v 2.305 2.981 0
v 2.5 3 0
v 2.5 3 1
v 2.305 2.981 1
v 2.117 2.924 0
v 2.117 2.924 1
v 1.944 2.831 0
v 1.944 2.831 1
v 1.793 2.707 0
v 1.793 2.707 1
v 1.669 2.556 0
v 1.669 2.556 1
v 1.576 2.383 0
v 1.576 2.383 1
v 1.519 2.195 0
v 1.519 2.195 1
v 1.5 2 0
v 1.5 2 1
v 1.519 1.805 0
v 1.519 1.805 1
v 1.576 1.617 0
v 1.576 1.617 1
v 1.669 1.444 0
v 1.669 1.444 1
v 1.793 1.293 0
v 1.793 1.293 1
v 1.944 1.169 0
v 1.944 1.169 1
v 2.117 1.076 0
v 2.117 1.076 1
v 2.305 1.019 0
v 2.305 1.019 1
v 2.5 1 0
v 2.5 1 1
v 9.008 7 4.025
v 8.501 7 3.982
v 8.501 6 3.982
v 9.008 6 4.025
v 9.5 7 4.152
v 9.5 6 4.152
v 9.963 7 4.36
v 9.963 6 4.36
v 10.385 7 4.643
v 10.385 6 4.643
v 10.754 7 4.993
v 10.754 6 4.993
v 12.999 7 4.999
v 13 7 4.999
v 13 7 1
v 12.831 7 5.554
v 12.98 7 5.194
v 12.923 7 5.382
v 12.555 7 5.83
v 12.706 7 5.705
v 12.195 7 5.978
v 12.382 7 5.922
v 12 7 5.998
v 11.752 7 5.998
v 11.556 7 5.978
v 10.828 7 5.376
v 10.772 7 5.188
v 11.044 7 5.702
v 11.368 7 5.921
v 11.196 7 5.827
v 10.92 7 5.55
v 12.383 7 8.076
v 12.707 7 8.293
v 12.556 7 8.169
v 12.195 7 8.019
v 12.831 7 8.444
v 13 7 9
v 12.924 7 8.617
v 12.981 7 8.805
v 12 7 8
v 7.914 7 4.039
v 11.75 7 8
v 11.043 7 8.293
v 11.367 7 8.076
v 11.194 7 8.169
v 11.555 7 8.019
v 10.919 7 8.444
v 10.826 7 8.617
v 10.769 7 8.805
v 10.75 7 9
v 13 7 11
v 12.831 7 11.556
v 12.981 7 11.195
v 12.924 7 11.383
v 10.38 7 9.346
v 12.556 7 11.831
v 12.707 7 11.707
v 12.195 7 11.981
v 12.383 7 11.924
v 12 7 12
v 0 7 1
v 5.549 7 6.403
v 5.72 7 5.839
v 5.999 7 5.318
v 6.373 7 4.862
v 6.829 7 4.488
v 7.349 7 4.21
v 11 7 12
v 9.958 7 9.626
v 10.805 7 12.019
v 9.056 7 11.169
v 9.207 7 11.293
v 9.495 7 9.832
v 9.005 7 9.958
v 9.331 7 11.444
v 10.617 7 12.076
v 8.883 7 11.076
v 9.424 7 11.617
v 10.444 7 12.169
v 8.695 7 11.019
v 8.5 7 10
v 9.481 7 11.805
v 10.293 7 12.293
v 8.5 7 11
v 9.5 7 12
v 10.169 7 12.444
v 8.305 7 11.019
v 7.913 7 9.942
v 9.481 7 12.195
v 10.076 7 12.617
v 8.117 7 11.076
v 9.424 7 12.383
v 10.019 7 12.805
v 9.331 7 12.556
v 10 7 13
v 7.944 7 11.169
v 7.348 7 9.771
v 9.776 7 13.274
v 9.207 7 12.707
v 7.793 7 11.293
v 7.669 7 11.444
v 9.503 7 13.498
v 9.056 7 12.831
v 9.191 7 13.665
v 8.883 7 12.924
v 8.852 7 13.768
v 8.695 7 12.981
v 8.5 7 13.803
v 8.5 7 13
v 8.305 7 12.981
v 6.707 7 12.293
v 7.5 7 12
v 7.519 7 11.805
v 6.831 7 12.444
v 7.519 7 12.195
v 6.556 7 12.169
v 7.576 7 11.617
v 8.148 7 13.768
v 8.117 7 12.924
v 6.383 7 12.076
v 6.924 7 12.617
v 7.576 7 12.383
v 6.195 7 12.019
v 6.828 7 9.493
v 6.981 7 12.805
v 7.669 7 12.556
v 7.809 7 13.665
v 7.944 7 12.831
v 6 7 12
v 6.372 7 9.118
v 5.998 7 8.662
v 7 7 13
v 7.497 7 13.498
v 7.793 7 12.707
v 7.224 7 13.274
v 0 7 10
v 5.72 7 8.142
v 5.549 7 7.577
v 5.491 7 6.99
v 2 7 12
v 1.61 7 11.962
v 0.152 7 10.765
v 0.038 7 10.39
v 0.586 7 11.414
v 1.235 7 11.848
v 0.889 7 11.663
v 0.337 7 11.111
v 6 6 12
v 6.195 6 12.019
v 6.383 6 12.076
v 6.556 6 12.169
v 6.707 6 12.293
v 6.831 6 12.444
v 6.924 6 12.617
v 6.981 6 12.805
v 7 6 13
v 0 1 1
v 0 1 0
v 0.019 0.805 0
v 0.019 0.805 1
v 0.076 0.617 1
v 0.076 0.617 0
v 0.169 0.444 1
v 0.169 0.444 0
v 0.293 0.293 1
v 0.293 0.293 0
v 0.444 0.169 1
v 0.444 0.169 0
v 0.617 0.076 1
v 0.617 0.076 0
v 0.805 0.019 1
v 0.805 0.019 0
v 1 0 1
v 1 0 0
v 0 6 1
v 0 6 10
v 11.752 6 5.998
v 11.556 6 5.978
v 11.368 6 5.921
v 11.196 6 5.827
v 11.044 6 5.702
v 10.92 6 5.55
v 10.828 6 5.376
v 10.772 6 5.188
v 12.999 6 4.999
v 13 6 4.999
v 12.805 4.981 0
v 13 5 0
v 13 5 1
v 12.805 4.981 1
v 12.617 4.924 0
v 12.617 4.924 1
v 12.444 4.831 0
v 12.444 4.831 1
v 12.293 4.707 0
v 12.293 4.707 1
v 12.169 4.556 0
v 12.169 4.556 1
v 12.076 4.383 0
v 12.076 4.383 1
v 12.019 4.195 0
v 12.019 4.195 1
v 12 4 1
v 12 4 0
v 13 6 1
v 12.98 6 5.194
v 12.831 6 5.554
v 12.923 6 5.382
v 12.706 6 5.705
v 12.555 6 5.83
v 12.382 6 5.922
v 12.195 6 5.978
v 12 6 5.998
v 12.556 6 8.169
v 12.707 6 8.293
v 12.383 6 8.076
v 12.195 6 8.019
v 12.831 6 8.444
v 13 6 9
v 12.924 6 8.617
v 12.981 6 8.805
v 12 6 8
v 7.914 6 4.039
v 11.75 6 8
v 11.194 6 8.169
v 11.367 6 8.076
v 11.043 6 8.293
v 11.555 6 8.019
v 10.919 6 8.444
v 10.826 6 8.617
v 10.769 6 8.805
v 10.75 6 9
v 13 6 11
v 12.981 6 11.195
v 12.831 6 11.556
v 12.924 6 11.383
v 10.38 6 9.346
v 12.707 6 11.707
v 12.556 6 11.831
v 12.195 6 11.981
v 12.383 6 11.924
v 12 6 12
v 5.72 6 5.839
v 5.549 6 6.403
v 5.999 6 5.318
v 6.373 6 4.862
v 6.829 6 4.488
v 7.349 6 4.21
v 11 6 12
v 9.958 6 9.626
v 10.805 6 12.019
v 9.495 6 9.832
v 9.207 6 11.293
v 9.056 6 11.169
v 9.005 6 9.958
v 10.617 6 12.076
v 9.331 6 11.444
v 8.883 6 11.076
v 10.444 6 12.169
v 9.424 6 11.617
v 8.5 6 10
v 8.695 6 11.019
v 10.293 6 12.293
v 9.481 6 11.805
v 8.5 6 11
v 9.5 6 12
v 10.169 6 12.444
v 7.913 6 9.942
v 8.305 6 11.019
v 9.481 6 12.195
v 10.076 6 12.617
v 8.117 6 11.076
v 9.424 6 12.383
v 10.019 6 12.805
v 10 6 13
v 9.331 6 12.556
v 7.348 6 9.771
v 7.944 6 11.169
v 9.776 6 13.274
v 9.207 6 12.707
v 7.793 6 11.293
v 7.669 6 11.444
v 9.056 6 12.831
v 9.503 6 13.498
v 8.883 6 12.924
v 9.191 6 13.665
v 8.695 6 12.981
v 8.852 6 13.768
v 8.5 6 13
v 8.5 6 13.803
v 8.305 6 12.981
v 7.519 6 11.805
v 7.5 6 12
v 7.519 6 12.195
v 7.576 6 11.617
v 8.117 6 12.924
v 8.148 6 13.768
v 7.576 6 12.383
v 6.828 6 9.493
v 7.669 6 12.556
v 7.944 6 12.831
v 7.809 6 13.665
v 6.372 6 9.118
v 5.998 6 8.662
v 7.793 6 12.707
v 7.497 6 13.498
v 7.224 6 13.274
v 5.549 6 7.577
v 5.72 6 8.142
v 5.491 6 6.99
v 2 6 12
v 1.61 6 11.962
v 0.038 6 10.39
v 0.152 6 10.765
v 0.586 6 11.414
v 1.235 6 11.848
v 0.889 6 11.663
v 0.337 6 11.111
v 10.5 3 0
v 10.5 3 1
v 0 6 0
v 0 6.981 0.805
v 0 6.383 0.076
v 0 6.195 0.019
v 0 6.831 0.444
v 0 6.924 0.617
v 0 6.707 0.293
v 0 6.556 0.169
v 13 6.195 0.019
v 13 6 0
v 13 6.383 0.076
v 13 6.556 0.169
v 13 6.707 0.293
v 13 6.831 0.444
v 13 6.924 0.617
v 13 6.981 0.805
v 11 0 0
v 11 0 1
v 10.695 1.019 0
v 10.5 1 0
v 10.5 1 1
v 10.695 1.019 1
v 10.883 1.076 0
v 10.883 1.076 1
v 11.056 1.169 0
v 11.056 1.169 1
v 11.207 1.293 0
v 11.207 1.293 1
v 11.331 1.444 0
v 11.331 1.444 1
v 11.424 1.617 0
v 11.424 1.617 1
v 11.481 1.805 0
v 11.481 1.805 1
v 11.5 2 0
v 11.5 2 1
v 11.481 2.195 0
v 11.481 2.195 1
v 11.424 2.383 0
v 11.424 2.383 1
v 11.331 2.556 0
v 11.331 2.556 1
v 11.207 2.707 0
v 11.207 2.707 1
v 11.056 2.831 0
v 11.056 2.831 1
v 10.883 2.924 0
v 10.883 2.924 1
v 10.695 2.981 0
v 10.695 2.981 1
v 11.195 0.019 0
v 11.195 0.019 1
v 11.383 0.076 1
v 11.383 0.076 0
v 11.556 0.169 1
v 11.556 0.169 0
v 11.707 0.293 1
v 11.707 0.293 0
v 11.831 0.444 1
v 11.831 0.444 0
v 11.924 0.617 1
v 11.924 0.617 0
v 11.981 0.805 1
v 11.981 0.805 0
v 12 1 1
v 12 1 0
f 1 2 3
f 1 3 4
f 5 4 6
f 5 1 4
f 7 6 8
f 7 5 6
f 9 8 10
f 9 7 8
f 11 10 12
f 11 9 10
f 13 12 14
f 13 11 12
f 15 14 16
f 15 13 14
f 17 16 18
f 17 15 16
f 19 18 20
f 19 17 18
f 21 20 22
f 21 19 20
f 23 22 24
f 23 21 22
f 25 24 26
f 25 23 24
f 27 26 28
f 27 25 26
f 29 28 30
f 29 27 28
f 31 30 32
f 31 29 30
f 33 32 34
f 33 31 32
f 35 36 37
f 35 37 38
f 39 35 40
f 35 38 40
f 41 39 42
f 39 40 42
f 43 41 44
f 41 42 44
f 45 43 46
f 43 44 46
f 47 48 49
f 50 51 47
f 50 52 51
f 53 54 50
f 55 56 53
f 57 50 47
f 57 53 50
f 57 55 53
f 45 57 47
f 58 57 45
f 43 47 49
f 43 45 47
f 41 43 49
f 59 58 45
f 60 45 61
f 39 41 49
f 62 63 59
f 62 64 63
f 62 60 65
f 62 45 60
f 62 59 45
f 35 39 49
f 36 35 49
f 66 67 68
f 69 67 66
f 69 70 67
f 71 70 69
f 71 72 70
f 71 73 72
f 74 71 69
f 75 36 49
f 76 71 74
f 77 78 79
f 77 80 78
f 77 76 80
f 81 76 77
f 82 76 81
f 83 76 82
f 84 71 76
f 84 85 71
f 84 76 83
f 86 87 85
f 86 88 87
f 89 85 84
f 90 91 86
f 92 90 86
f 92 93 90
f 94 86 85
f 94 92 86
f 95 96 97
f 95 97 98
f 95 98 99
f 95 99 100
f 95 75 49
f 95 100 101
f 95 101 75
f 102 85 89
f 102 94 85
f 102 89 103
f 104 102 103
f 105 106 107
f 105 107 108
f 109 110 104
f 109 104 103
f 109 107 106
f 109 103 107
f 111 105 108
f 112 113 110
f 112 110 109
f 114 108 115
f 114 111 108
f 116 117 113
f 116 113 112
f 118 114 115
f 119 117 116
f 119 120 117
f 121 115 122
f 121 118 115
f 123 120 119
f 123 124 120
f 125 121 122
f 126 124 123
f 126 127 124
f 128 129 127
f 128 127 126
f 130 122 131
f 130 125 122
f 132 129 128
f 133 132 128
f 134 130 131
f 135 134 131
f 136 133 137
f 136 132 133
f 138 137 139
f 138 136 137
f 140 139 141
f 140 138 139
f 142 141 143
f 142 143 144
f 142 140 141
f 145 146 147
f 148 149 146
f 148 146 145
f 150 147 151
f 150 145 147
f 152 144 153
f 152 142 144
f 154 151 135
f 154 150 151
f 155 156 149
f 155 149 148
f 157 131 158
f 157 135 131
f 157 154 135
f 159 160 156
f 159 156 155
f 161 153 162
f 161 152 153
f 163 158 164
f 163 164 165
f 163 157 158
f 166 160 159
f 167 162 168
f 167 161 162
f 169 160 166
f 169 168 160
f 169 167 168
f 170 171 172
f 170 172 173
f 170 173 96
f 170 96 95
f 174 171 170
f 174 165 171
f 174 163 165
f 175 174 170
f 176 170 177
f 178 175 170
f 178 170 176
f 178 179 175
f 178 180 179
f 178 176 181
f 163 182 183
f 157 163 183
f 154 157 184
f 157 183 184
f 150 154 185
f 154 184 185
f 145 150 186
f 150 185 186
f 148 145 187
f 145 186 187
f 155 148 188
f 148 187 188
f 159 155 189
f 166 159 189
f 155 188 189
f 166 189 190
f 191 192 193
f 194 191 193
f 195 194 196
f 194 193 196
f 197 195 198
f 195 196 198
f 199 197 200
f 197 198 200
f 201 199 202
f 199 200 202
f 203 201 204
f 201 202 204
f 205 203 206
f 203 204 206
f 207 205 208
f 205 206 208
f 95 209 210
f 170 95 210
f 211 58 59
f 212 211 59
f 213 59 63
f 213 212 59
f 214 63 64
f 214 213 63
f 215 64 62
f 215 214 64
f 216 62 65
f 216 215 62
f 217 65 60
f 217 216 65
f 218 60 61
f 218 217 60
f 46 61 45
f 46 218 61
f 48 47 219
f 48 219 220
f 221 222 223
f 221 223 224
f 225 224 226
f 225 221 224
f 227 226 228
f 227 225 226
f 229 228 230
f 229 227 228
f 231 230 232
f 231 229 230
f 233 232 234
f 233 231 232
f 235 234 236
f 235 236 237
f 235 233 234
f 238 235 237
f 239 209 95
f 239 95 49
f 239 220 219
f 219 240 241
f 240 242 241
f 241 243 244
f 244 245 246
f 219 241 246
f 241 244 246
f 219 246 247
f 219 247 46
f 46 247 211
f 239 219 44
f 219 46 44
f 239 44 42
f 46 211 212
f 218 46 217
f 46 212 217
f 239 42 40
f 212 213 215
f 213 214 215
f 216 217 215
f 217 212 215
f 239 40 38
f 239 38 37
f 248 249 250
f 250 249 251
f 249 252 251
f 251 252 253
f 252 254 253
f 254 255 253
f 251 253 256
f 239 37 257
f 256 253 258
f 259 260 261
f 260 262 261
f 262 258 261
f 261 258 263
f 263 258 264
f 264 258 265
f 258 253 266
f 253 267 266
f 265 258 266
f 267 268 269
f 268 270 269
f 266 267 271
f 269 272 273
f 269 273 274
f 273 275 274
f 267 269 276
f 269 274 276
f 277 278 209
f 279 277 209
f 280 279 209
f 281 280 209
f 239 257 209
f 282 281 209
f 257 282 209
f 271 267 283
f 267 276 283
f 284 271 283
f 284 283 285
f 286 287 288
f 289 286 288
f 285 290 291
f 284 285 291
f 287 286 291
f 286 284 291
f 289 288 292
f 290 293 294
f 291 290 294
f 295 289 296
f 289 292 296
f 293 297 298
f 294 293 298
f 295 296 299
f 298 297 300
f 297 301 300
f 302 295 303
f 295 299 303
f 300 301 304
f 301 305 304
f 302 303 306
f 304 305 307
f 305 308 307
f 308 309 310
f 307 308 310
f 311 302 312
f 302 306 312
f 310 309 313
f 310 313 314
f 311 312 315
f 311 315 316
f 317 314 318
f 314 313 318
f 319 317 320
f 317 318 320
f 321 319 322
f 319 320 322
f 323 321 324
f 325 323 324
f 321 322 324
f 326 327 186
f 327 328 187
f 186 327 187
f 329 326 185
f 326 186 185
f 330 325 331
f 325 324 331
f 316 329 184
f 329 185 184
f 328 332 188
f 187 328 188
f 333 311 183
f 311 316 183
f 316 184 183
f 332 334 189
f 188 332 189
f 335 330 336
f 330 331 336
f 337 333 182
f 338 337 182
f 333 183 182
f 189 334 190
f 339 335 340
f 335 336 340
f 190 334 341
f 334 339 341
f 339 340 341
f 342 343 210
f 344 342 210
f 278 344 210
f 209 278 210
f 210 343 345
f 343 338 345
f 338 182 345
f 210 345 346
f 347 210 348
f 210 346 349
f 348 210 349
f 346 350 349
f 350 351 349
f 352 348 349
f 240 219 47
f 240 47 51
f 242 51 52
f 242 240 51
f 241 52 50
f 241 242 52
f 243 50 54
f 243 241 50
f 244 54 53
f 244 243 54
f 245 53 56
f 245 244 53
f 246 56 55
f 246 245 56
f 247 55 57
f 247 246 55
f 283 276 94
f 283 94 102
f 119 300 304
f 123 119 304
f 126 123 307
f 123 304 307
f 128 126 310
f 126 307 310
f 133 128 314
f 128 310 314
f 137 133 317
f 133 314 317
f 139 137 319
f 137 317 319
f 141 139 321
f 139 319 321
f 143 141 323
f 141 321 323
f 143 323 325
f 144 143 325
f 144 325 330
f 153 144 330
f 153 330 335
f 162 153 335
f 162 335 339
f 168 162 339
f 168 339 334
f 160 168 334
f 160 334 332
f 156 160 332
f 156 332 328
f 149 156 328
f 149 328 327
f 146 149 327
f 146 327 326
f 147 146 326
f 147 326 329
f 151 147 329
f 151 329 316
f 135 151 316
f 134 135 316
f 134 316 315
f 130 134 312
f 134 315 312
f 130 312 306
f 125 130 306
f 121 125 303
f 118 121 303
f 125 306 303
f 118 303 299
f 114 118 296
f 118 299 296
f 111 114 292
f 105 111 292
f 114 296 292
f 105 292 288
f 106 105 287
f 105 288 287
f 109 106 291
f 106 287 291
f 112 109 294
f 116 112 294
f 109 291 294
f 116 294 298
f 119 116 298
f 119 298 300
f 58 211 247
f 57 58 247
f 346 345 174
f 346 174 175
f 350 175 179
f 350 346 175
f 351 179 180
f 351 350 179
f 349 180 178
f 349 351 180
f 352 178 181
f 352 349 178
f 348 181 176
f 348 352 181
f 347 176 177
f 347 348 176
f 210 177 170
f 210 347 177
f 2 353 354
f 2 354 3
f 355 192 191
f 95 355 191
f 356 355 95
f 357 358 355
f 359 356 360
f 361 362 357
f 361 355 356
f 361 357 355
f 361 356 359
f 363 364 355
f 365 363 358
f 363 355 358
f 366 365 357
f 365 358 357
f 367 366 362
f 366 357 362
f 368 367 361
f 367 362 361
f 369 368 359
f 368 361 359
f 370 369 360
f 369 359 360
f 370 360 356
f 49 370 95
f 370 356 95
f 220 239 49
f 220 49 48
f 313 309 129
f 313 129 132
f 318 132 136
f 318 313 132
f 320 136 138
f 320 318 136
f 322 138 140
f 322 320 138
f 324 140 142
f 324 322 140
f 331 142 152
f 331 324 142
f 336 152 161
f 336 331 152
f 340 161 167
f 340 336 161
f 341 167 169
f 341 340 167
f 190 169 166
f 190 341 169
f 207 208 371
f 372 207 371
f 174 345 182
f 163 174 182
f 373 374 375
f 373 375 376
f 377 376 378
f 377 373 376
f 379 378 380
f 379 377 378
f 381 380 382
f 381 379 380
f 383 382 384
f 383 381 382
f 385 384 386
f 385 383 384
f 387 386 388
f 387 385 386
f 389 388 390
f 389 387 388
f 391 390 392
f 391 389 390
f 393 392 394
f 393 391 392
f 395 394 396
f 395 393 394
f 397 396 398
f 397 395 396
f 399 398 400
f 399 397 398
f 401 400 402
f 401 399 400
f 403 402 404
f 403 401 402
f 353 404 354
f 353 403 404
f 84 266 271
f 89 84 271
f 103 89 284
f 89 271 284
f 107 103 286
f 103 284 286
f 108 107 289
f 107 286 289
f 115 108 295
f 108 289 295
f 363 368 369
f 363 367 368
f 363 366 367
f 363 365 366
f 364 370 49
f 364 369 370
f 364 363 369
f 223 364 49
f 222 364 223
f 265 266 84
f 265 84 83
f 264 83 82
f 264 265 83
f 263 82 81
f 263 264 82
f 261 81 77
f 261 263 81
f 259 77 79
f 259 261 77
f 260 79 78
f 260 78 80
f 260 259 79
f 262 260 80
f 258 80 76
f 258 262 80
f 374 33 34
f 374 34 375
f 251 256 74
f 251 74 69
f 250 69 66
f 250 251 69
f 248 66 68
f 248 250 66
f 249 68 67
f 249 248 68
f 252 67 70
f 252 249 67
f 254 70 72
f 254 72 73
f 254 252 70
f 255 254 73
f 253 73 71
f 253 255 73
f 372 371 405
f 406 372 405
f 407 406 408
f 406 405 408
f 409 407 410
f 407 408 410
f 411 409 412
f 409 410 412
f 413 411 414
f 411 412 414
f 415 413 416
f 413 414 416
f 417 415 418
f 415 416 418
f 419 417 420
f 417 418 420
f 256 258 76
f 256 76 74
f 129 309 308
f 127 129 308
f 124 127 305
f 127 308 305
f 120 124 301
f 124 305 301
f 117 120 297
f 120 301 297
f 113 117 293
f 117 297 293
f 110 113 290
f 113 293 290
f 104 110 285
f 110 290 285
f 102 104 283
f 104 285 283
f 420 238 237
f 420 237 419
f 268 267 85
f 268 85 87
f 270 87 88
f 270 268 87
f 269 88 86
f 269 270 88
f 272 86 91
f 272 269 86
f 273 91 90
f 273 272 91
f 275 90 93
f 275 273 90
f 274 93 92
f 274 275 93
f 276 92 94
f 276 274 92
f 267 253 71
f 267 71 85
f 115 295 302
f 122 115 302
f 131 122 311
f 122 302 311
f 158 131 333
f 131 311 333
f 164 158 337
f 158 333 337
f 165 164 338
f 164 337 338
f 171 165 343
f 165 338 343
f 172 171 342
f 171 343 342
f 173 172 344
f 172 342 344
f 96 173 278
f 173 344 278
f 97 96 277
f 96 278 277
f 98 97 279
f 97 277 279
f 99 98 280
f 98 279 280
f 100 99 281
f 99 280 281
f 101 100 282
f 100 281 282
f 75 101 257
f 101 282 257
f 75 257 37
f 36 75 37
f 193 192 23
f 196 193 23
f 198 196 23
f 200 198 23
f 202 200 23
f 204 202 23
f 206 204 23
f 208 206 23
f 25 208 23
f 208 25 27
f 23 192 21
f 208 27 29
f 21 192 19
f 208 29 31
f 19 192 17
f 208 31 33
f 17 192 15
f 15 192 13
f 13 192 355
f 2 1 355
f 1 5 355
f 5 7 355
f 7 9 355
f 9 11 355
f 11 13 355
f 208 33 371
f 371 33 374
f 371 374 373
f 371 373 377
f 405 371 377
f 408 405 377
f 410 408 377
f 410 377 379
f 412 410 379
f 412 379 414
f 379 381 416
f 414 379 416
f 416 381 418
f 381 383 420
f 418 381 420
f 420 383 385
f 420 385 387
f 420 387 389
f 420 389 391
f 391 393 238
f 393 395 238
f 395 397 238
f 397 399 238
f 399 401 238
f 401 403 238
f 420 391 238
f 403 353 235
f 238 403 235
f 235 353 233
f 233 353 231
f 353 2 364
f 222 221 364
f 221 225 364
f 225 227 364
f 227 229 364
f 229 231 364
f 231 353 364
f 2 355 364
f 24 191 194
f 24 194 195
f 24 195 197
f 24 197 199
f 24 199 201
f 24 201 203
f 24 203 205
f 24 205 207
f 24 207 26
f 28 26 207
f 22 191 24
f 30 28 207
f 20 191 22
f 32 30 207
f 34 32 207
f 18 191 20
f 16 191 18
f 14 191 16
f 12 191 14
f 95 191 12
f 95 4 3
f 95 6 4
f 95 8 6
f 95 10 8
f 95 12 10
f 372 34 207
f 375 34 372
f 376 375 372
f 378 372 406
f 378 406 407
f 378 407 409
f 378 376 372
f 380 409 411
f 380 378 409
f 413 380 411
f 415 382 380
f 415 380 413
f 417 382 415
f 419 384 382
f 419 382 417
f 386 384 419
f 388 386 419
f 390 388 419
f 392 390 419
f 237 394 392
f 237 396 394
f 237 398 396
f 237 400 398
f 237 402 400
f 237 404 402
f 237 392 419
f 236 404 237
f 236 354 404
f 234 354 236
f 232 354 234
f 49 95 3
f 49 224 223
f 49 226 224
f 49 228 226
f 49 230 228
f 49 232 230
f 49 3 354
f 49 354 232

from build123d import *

# Parameters (mm, degrees)
EXTRUDE004_DEPTH                     = 5
EXTRUDE004_ONTO_SKETCH003_ROLL_ANGLE = 90
SKETCH004_AS_DRAWN_R                 = 1
EXTRUDE003_DEPTH                     = 10
EXTRUDE003_ONTO_SKETCH004_ROLL_ANGLE = 90
EXTRUDE005_DEPTH                     = 1
EXTRUDE005_ONTO_SKETCH002_ROLL_ANGLE = 90
EXTRUDE006_DEPTH                     = 15
EXTRUDE001_DEPTH                     = 1
EXTRUDE_DEPTH                        = 1


with BuildPart() as extrude004:
    # Sketch003 as drawn → Extrude004 (new)
    with BuildSketch(Plane.XY):
        with BuildLine():
            ThreePointArc((8.500012, 10), (5.490931, 6.990186), (8.501267, 3.981628))
            ThreePointArc((8.501267, 3.981628), (9.735803, 4.24621), (10.754109, 4.992623))
            ThreePointArc((11.751661, 5.997636), (11.044132, 5.702333), (10.754109, 4.992623))
            Line((11.751661, 5.997636), (12.000229, 5.997636))
            ThreePointArc((12.999313, 4.999389), (12.706459, 5.705374), (12.000229, 5.997636))
            Line((12.999313, 4.999389), (15.5, 5))
            Line((15.5, 5), (15.5, 9))
            Line((13, 9), (15.5, 9))
            ThreePointArc((12, 8), (12.707107, 8.292893), (13, 9))
            Line((11.75, 8), (12, 8))
            ThreePointArc((10.75, 9), (11.042893, 8.292893), (11.75, 8))
            ThreePointArc((10.75, 9), (9.731212, 9.738962), (8.500012, 10))
        make_face()
    extrude(amount=-EXTRUDE004_DEPTH)


with BuildPart() as extrude004_1:
    # Extrude004 onto Sketch003 roll: moved
    add(extrude004.part.rotate(Axis((0, 0, 0), (1, 0, 0)), EXTRUDE004_ONTO_SKETCH003_ROLL_ANGLE))


with BuildPart() as extrude004_2:
    # Extrude004 onto Sketch003 placement: moved
    add(extrude004_1.part.moved(Location((0, 3, 0))))


with BuildPart() as extrude003:
    # Sketch004 as drawn → Extrude003 (new)
    with BuildSketch(Plane.XY):
        with Locations((8.5, 12)):
            Circle(SKETCH004_AS_DRAWN_R)
    extrude(amount=-EXTRUDE003_DEPTH)


with BuildPart() as extrude003_1:
    # Extrude003 onto Sketch004 roll: moved
    add(extrude003.part.rotate(Axis((0, 0, 0), (1, 0, 0)), EXTRUDE003_ONTO_SKETCH004_ROLL_ANGLE))


with BuildPart() as extrude003_2:
    # Extrude003 onto Sketch004 placement: moved
    add(extrude003_1.part.moved(Location((0, 4, 0))))


with BuildPart() as extrude003_3:
    # Extrude003 placement: moved
    add(extrude003_2.part.moved(Location((0, -2, 0))))


with BuildPart() as cut002:
    # Sketch002 as drawn → Extrude005 (new)
    with BuildSketch(Plane.XY):
        with BuildLine():
            Line((0, 1), (0, 10))
            ThreePointArc((2, 12), (0.585786, 11.414214), (0, 10))
            Line((2, 12), (6, 12))
            ThreePointArc((6, 12), (6.707107, 12.292893), (7, 13))
            ThreePointArc((10, 13.000001), (8.5, 13.802776), (7, 13))
            ThreePointArc((10, 13.000001), (10.292893, 12.292893), (11, 12))
            Line((12, 12), (11, 12))
            ThreePointArc((13, 11), (12.707107, 11.707107), (12, 12))
            Line((13, 1), (13, 11))
            Line((0, 1), (13, 1))
        make_face()
    extrude(amount=-EXTRUDE005_DEPTH)


with BuildPart() as cut002_1:
    # Extrude005 onto Sketch002 roll: moved
    add(cut002.part.rotate(Axis((0, 0, 0), (1, 0, 0)), EXTRUDE005_ONTO_SKETCH002_ROLL_ANGLE))


with BuildPart() as cut002_2:
    # Extrude005 onto Sketch002 placement: moved
    add(cut002_1.part.moved(Location((0, 6, 0))))

    # Cut001: cut Extrude003
    add(extrude003_3.part, mode=Mode.SUBTRACT)

    # Cut002: cut Extrude004
    add(extrude004_2.part, mode=Mode.SUBTRACT)


with BuildPart() as extrude006:
    # Sketch005 → Extrude006 (new body)
    with BuildSketch(Plane.YZ):
        with BuildLine():
            ThreePointArc((6, 0), (6.707107, 0.292893), (7, 1))
            Line((7, 1), (7, 0))
            Line((6, 0), (7, 0))
        make_face()
    extrude(amount=EXTRUDE006_DEPTH)


with BuildPart() as extrude001:
    # Sketch001 → Extrude001 (new body)
    with BuildSketch(Plane.XY):
        with BuildLine():
            ThreePointArc((10.5, 1), (11.5, 2), (10.5, 3))
            Line((10.5, 3), (2.5, 3))
            ThreePointArc((2.5, 3), (1.5, 2), (2.5, 1))
            Line((2.5, 1), (10.5, 1))
        make_face()
    extrude(amount=EXTRUDE001_DEPTH)


with BuildPart() as cut003:
    # Sketch → Extrude (new body)
    with BuildSketch(Plane.XY):
        with BuildLine():
            ThreePointArc((0, 1), (0.292893, 0.292893), (1, 0))
            Line((1, 0), (11, 0))
            ThreePointArc((11, 0), (11.707107, 0.292893), (12, 1))
            Line((12, 4), (12, 1))
            ThreePointArc((13, 5), (12.292893, 4.707107), (12, 4))
            Line((13, 7), (13, 5))
            Line((0, 7), (13, 7))
            Line((0, 1), (0, 7))
        make_face()
    extrude(amount=EXTRUDE_DEPTH)

    # Cut: cut Extrude001
    add(extrude001.part, mode=Mode.SUBTRACT)

    # Cut003: cut Extrude006
    add(extrude006.part, mode=Mode.SUBTRACT)


solid = Compound([cut002_2.part, cut003.part])
